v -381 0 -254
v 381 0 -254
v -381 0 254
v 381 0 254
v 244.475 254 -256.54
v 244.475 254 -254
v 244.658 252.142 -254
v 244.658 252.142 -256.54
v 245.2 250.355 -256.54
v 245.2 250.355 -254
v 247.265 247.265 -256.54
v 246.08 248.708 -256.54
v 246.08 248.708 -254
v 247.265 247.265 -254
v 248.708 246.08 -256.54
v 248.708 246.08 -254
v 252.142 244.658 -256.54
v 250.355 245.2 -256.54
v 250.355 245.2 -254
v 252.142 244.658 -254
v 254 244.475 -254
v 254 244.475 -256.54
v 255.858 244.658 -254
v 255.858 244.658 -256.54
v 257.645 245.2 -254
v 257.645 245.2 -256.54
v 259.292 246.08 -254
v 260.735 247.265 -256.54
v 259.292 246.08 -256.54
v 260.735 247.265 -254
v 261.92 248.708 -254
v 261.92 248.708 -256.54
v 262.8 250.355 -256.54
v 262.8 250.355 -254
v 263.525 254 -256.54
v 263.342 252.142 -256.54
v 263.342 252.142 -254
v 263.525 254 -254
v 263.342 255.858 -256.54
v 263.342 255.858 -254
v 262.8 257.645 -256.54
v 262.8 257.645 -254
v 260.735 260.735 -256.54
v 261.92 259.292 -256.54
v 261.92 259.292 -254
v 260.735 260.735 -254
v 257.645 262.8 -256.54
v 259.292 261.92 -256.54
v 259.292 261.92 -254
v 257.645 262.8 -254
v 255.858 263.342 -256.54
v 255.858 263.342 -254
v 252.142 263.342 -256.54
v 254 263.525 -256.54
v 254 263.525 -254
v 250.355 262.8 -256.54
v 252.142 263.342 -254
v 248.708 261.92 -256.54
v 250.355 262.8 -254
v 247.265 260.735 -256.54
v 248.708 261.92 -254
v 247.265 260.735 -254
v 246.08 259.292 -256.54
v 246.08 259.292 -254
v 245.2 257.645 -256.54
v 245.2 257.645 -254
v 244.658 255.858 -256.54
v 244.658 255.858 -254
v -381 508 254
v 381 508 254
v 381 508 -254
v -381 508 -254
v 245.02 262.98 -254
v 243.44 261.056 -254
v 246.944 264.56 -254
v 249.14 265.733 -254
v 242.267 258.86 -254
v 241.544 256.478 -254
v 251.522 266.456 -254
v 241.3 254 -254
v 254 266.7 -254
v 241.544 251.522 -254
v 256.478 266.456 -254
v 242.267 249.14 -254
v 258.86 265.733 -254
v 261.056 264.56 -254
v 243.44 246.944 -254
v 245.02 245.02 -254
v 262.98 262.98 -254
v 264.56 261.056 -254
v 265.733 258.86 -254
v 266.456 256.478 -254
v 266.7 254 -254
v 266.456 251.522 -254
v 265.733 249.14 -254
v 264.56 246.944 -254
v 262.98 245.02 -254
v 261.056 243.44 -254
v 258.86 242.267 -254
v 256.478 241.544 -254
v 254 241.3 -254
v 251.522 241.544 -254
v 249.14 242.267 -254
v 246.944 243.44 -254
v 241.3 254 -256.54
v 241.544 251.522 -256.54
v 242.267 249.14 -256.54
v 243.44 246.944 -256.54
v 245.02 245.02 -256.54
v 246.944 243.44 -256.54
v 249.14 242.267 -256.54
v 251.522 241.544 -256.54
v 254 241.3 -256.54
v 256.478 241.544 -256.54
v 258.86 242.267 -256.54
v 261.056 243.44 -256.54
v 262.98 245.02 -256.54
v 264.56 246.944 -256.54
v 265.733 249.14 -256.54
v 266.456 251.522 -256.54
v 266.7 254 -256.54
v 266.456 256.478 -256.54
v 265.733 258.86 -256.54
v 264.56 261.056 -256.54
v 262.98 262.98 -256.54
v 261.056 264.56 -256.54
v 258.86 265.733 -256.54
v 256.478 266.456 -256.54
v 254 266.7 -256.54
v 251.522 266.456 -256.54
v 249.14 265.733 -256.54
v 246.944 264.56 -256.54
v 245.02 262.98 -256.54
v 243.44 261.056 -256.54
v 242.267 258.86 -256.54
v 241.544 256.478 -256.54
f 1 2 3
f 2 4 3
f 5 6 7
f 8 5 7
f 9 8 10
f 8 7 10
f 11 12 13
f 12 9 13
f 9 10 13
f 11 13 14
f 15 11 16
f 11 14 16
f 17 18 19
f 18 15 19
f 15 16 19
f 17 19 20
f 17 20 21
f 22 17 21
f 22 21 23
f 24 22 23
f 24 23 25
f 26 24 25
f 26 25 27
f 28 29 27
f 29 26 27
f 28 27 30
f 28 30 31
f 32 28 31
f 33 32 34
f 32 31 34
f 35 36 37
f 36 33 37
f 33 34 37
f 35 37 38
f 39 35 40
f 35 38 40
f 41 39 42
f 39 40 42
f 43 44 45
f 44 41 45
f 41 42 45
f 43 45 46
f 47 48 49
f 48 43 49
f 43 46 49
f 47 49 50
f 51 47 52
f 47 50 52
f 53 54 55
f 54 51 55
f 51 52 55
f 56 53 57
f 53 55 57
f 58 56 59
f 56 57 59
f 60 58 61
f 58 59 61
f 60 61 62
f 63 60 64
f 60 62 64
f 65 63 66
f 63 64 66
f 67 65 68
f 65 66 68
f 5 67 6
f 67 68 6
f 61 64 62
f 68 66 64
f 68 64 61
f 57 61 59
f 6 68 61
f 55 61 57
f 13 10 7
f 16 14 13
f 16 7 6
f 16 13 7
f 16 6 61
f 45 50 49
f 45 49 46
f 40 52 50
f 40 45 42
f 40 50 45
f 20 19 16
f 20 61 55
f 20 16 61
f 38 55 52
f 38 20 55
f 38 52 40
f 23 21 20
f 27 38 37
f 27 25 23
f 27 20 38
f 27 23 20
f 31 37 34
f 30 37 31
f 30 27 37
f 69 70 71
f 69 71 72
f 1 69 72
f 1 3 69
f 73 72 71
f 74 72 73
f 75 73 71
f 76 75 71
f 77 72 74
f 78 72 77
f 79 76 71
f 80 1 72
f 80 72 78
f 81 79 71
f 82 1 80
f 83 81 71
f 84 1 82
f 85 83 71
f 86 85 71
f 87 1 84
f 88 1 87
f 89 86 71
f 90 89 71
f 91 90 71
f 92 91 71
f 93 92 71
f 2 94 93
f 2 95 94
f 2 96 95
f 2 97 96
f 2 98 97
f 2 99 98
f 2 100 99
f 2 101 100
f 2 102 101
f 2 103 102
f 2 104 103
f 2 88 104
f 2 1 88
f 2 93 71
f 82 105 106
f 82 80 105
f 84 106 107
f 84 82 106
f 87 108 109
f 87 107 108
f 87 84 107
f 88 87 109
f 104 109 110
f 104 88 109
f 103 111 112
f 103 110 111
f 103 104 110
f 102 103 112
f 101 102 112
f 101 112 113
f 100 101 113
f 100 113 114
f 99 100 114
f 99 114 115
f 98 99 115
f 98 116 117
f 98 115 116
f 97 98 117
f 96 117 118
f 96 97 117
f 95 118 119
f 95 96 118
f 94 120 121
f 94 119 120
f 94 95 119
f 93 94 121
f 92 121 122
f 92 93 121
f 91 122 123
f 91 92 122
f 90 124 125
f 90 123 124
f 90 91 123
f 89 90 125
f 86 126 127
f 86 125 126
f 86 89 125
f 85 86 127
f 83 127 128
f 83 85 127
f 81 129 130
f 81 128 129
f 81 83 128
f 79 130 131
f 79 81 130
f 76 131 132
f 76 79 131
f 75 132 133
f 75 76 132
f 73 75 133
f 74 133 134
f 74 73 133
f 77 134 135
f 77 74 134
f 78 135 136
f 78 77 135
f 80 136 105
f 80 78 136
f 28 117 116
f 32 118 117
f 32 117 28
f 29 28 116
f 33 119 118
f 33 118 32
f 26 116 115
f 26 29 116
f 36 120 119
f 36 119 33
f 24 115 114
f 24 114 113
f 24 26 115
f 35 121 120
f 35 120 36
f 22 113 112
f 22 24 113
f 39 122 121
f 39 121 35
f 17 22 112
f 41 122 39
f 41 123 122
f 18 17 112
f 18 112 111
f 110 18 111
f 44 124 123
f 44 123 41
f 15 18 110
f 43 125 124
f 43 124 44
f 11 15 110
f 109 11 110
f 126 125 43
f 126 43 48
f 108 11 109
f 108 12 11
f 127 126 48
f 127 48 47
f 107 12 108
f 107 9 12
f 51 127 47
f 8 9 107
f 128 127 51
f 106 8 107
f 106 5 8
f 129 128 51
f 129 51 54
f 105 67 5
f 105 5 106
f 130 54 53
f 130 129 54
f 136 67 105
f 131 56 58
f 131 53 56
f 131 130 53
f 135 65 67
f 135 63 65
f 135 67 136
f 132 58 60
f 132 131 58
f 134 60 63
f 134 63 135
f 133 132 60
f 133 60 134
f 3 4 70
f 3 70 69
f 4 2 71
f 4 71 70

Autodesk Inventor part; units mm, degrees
ref_plane "YZ Plane" through (0, 0, 0) normal (1, 0, 0) x (0, 1, 0)
ref_plane "XZ Plane" through (0, 0, 0) normal (0, 1, 0) x (-1, 0, 0)
ref_plane "XY Plane" through (0, 0, 0) normal (0, 0, 1) x (1, 0, 0)
sketch "Sketch1" plane through (0, 0, 0) normal (0, 1, 0) x (-1, 0, 0)
  line L0 (-381, 254) -> (381, 254)
  line L1 (381, 254) -> (381, -254)
  line L2 (381, -254) -> (-381, -254)
  line L3 (-381, -254) -> (-381, 254)
  line L4 (-381, 254) -> (381, -254) construction
  line L5 (381, 254) -> (-381, -254) construction
  point P0 (0, 0)
  dimension "d0" = 762
  dimension "d1" = 508
extrude "Extrusion1" add sketch "Sketch1" along normal blind 508
sketch "Sketch2" plane through (381, 0, -254) normal (0, 0, -1) x (-1, 0, 0)
  line L0 (0, 0) -> (0, 508) projected
  line L1 (0, 254) -> (127, 254) construction
  circle A0 centre (127, 254) radius 9.525
  circle A1 centre (127, 254) radius 12.7
  point P0 (381, 0)
  dimension "d4" = 127
  dimension "d5" = 19.05
  dimension "d6" = 25.4
extrude "Extrusion2" add sketch "Sketch2" along normal blind 2.54
properties part number "Generator"
